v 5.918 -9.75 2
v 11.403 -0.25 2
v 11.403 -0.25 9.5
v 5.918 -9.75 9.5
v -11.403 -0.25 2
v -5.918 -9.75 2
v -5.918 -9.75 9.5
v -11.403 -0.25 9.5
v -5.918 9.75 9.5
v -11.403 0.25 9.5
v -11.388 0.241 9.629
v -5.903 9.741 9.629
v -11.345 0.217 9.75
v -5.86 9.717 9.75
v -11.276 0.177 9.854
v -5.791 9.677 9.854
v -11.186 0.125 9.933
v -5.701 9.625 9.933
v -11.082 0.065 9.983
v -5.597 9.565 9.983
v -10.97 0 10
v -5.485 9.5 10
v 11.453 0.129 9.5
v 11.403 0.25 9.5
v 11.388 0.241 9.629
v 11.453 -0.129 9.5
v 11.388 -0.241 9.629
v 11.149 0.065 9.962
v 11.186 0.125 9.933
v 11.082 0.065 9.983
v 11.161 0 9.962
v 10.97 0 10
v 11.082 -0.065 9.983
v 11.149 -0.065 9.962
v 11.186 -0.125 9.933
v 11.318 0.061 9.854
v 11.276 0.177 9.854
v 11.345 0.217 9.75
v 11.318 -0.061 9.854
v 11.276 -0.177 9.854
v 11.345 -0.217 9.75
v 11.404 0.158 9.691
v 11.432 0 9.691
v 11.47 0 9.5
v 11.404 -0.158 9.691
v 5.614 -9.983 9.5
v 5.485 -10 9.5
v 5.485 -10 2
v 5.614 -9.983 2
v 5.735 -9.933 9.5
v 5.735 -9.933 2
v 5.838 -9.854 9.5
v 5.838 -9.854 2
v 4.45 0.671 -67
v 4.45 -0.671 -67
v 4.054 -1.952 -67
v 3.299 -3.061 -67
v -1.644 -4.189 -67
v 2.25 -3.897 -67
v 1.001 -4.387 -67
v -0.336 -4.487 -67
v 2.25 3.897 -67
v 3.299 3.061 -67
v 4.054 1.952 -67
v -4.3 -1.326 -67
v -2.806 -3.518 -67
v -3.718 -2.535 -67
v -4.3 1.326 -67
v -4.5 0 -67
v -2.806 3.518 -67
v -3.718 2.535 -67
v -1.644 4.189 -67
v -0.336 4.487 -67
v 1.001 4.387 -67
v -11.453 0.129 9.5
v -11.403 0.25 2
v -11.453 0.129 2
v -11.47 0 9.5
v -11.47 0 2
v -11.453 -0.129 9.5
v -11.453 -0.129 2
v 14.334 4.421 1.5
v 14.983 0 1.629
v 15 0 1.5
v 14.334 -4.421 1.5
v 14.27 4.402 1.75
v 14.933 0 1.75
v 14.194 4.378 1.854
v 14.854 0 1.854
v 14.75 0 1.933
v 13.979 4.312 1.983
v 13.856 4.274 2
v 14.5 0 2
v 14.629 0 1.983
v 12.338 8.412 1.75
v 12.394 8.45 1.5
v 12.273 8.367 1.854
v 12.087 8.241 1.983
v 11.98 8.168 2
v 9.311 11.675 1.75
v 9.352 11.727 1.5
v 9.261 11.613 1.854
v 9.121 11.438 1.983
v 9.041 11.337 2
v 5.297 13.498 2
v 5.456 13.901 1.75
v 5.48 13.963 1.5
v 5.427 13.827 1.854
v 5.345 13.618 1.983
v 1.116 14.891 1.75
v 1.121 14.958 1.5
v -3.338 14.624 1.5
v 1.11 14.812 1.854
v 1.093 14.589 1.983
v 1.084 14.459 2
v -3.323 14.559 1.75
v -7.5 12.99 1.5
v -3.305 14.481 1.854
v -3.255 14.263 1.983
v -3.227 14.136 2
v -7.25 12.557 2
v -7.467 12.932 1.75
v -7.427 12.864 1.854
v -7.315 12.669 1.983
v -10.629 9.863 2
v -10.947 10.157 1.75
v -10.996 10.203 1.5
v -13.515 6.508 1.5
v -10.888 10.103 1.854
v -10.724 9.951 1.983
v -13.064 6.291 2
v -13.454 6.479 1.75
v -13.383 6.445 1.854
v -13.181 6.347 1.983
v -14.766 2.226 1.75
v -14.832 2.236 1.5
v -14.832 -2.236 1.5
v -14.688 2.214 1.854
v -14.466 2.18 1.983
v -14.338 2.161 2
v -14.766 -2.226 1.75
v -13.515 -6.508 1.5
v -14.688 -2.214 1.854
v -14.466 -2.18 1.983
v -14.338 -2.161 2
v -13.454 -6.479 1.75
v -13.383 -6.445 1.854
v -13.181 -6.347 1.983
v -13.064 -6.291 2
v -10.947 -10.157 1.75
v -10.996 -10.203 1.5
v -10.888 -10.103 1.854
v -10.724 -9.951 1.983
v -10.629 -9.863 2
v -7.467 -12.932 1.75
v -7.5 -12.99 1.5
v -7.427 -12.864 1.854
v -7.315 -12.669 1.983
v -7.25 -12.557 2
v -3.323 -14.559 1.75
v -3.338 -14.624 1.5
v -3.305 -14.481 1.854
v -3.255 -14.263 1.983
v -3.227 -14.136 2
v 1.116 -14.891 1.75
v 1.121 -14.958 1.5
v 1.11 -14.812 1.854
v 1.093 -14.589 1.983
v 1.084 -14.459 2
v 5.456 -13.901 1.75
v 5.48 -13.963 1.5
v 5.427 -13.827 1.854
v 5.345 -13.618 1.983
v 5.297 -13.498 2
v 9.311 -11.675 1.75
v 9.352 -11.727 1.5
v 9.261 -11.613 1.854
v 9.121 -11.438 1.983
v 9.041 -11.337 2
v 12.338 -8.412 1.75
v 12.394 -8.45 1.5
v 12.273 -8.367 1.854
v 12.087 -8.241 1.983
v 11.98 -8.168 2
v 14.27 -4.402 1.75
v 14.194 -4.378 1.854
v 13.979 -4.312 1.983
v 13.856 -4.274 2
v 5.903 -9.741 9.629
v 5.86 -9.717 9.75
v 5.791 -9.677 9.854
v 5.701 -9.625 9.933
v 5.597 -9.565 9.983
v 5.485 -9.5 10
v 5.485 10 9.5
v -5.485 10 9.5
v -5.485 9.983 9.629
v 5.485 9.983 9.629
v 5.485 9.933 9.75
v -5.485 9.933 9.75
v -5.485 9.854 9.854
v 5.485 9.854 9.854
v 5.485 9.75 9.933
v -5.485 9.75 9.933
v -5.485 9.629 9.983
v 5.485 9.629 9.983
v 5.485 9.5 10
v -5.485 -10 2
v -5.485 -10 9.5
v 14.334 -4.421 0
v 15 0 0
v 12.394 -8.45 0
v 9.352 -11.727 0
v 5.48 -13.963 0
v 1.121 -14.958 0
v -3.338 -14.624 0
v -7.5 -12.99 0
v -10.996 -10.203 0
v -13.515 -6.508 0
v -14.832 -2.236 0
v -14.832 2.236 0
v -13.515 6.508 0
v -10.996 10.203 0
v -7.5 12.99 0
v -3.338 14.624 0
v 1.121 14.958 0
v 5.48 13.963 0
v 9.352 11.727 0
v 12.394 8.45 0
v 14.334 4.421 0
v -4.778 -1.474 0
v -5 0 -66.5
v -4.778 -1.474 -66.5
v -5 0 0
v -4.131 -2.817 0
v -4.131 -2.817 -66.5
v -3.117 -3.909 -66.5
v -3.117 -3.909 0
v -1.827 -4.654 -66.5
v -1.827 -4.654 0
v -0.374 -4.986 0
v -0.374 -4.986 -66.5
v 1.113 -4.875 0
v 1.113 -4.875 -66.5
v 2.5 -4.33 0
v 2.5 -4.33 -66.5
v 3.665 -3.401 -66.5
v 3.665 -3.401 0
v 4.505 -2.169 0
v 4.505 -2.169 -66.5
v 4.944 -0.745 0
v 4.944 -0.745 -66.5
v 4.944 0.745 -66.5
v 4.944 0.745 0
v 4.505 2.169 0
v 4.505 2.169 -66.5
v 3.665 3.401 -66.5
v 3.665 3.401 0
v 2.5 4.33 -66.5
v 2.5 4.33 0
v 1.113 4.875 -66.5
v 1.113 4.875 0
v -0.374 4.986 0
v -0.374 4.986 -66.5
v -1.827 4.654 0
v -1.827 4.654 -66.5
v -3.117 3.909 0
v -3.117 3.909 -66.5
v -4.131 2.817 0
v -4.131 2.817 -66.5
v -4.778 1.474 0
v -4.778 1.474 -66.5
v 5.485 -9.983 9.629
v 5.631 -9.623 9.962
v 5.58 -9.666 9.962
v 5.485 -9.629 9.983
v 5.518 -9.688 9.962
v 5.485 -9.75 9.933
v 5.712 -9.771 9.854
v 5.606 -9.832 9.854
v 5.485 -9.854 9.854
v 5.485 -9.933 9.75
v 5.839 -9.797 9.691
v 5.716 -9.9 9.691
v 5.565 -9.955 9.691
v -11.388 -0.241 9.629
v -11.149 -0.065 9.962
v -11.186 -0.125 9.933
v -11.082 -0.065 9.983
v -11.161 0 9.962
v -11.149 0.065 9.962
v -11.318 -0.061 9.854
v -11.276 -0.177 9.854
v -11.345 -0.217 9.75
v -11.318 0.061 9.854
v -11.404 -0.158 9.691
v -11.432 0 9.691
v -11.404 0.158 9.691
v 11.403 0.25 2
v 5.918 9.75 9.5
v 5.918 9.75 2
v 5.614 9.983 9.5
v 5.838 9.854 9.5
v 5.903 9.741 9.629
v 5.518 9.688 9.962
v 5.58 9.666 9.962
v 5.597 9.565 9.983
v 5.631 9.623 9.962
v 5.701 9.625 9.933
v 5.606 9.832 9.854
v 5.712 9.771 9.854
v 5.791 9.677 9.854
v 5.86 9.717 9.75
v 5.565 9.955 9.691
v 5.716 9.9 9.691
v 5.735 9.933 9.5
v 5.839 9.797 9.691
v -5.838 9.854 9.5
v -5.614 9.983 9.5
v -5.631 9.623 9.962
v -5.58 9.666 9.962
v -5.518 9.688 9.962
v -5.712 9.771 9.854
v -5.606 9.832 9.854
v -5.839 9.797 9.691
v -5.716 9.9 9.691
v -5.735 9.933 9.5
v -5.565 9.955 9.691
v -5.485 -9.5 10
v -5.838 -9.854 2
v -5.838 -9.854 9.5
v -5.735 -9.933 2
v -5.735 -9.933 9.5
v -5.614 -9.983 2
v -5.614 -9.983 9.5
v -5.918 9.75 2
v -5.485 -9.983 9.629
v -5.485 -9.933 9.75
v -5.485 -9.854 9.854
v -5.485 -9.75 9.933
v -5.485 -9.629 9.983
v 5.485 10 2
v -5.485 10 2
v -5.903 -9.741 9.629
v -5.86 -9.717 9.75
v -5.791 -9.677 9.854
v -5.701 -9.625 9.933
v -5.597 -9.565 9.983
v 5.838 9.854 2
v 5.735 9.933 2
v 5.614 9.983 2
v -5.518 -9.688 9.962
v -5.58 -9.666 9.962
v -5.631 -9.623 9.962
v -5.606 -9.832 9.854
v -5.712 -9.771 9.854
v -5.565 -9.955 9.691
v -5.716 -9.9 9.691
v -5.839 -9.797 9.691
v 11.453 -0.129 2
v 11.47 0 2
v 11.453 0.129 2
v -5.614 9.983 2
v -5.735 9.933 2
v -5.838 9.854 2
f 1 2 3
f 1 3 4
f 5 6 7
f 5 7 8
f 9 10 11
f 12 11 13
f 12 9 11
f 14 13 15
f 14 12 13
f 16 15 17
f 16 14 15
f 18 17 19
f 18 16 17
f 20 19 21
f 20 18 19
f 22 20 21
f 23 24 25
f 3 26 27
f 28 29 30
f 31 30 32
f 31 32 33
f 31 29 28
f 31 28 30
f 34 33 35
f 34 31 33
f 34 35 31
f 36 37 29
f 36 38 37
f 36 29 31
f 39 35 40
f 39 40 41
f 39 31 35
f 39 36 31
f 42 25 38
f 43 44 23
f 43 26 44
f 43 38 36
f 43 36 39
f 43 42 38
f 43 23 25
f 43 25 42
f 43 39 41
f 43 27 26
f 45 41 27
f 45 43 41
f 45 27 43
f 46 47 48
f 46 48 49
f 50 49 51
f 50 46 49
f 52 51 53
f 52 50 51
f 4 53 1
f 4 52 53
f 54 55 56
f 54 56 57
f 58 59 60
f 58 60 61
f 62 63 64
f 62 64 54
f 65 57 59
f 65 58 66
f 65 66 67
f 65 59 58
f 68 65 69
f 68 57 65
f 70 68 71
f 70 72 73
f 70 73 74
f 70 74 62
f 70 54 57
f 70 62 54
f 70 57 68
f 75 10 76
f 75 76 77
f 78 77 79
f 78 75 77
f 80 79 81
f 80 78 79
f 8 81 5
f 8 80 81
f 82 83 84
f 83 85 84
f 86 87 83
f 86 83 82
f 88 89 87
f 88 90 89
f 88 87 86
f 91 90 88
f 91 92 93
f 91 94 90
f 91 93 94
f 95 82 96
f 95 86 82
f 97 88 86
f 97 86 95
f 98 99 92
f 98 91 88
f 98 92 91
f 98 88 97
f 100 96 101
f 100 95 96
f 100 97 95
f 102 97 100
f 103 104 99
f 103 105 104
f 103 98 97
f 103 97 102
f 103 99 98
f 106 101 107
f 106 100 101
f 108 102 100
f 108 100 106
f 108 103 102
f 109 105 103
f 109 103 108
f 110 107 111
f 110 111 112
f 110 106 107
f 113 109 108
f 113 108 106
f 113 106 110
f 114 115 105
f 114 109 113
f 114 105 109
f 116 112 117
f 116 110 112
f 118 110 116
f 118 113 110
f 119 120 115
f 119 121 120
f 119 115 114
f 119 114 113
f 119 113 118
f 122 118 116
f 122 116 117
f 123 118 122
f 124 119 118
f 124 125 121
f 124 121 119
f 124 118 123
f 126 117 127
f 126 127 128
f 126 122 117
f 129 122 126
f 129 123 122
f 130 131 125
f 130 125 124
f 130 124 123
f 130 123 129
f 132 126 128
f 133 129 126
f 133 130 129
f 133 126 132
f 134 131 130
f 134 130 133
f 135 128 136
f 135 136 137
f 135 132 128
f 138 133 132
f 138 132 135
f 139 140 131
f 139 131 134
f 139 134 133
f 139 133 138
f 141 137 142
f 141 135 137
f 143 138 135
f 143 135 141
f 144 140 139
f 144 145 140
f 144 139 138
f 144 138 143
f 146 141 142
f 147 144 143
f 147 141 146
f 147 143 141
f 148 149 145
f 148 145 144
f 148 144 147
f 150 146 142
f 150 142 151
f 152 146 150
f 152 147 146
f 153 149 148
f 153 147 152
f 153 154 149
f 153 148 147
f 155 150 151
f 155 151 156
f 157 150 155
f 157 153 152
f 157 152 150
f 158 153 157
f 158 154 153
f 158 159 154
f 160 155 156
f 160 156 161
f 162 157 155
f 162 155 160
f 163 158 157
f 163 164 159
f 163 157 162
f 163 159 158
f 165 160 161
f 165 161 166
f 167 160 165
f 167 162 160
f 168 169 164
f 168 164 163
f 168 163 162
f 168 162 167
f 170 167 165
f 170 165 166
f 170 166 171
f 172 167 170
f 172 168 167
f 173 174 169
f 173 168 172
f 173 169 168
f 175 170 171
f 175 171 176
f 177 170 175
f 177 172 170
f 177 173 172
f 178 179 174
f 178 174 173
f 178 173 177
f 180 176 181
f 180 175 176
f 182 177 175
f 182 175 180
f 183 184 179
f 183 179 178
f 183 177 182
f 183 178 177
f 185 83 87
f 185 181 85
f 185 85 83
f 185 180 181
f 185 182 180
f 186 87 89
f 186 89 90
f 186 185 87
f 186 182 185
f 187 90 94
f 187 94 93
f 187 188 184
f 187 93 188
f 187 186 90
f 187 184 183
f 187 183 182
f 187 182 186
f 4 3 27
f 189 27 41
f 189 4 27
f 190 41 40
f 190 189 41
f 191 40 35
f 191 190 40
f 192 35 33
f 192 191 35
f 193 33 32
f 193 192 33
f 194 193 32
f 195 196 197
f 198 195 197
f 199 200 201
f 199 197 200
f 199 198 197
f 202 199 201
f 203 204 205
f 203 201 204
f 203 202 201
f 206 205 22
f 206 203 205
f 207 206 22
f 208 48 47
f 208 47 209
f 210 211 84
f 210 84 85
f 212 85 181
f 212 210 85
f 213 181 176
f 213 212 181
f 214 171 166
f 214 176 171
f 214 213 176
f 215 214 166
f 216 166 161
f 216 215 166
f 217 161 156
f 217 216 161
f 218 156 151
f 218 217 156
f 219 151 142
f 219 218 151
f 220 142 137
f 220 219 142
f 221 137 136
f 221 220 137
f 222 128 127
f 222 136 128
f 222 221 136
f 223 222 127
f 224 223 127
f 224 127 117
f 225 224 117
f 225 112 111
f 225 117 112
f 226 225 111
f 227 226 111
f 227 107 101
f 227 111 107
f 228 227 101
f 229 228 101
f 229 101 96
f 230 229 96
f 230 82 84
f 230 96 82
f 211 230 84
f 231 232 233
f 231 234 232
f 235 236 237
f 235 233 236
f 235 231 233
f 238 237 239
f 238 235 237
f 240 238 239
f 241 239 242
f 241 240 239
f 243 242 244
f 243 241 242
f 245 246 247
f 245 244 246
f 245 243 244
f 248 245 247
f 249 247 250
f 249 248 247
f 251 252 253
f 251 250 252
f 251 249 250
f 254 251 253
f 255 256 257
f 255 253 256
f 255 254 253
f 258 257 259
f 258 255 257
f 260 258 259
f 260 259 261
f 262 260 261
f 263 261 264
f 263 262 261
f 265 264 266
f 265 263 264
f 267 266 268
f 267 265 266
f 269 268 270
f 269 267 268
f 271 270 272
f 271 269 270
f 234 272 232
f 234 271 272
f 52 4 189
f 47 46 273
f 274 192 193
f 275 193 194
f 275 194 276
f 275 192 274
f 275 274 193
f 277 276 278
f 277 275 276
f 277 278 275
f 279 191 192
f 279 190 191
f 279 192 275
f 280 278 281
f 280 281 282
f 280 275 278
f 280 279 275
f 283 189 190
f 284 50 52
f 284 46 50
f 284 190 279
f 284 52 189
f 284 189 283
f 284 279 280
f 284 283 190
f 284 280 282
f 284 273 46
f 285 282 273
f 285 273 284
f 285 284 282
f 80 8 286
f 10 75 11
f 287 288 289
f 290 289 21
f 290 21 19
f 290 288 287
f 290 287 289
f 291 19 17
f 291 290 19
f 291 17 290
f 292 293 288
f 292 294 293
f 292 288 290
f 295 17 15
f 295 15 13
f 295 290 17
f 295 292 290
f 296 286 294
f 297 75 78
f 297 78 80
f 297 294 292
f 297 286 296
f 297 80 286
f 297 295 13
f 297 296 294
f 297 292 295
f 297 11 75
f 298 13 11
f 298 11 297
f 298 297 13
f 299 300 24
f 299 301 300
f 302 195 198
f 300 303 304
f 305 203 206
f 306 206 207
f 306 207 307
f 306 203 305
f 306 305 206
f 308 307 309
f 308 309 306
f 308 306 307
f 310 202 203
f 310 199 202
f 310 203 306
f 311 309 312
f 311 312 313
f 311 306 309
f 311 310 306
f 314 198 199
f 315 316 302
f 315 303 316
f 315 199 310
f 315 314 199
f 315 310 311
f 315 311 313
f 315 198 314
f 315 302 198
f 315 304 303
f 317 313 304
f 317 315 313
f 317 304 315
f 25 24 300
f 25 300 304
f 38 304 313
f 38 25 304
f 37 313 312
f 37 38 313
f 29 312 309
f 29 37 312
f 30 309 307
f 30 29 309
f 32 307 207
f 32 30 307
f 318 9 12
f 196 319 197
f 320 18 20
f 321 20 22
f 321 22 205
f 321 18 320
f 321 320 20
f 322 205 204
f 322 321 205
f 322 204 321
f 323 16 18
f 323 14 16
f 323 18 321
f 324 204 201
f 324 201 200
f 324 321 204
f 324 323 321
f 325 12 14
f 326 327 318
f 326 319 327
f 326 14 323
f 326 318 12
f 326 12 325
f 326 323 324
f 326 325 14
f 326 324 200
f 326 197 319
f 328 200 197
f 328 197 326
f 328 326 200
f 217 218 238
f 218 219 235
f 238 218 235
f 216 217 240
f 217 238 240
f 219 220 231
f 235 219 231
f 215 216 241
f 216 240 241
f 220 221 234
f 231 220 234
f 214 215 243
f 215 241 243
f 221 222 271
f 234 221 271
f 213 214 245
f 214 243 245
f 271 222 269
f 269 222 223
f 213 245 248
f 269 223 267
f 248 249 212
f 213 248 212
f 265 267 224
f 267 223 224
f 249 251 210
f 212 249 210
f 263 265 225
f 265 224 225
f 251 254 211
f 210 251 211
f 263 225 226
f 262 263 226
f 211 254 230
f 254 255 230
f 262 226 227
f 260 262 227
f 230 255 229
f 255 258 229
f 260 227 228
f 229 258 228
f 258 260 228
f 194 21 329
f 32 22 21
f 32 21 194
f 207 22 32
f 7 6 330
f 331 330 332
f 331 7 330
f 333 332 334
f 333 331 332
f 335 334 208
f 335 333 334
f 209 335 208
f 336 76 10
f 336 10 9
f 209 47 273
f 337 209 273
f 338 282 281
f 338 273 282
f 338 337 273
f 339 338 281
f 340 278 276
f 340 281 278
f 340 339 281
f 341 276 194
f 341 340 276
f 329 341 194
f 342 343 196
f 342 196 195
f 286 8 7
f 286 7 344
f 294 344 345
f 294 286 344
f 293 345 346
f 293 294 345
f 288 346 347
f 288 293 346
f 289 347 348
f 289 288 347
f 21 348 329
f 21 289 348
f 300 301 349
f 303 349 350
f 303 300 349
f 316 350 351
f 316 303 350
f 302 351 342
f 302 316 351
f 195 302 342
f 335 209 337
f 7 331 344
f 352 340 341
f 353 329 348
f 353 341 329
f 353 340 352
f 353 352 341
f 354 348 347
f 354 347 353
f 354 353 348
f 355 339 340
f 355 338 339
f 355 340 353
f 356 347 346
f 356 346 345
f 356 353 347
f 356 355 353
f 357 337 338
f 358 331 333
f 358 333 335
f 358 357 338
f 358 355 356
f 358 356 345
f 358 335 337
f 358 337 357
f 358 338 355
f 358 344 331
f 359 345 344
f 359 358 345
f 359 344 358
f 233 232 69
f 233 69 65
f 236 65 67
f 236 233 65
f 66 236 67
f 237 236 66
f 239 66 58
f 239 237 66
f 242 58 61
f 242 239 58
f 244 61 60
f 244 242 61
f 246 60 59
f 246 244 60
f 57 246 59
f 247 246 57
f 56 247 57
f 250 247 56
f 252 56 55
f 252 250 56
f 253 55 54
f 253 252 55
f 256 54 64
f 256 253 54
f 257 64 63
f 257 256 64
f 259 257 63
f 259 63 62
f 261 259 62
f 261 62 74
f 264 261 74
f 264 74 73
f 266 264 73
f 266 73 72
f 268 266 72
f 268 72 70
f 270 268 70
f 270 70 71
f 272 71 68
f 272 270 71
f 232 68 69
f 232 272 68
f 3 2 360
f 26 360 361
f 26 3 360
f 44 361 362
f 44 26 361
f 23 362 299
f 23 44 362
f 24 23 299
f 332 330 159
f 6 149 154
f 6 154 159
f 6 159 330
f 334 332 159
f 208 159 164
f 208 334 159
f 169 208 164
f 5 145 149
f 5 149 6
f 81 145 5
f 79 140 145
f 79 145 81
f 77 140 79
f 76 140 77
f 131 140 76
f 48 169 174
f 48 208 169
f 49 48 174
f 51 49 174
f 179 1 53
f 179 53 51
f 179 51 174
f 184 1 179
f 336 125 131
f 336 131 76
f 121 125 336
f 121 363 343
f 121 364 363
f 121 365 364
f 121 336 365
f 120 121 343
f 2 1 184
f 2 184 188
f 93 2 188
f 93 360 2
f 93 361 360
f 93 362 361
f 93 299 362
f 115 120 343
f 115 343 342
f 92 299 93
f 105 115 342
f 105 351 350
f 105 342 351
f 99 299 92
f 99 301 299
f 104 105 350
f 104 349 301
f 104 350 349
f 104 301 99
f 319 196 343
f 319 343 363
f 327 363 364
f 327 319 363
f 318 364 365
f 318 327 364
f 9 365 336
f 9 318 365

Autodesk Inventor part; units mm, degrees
ref_plane "YZ Plane" through (0, 0, 0) normal (1, 0, 0) x (0, 1, 0)
ref_plane "XZ Plane" through (0, 0, 0) normal (0, 1, 0) x (-1, 0, 0)
ref_plane "XY Plane" through (0, 0, 0) normal (0, 0, 1) x (1, 0, 0)
sketch "草图1" plane through (0, 0, 0) normal (0, 0, 1) x (1, 0, 0)
  circle A0 centre (0, 0) radius 15
  dimension "d0" = 30
extrude "拉伸1" add sketch "草图1" along normal blind 2
sketch "草图2" plane through (0, 0, 2) normal (0, 0, 1) x (1, 0, 0)
  line L0 (5.7735, -10) -> (-5.7735, -10)
  line L1 (-5.7735, -10) -> (-11.547, 0)
  line L2 (-11.547, 0) -> (-5.7735, 10)
  line L3 (-5.7735, 10) -> (5.7735, 10)
  line L4 (5.7735, 10) -> (11.547, 0)
  line L5 (11.547, 0) -> (5.7735, -10)
  line L6 (0, 0) -> (0, 3.0227)
  point P0 (0, 10)
  dimension "d3" = 3.0227
  dimension "d4" = 20
extrude "拉伸2" add sketch "草图2" along normal blind 8
fillet "圆角1" radius 0.5 13 edges at (-5.7735, -10, 6) (5.7735, -10, 6) (11.547, 0, 6) (5.7735, 10, 6) (-5.7735, 10, 6) (-11.547, 0, 6) (-8.6603, 5, 10) (-8.6603, -5, 10) (0, 10, 10) (8.6603, 5, 10) (8.6603, -5, 10) (0, -10, 10) (-15, 0, 2)
sketch "草图3" plane through (0, 0, 0) normal (0, 0, -1) x (-1, 0, 0)
  circle A0 centre (0, 0) radius 5
  dimension "d8" = 10
extrude "拉伸3" add sketch "草图3" along normal blind 67
thread "螺纹1" size "M10x1.5" class "6g" standard "ANSI Metric M Profile" full length
chamfer "倒角1" distance 0.5 angle 45 1 edges at (5, 0, -67)
properties part number "主动轮固定螺丝"
